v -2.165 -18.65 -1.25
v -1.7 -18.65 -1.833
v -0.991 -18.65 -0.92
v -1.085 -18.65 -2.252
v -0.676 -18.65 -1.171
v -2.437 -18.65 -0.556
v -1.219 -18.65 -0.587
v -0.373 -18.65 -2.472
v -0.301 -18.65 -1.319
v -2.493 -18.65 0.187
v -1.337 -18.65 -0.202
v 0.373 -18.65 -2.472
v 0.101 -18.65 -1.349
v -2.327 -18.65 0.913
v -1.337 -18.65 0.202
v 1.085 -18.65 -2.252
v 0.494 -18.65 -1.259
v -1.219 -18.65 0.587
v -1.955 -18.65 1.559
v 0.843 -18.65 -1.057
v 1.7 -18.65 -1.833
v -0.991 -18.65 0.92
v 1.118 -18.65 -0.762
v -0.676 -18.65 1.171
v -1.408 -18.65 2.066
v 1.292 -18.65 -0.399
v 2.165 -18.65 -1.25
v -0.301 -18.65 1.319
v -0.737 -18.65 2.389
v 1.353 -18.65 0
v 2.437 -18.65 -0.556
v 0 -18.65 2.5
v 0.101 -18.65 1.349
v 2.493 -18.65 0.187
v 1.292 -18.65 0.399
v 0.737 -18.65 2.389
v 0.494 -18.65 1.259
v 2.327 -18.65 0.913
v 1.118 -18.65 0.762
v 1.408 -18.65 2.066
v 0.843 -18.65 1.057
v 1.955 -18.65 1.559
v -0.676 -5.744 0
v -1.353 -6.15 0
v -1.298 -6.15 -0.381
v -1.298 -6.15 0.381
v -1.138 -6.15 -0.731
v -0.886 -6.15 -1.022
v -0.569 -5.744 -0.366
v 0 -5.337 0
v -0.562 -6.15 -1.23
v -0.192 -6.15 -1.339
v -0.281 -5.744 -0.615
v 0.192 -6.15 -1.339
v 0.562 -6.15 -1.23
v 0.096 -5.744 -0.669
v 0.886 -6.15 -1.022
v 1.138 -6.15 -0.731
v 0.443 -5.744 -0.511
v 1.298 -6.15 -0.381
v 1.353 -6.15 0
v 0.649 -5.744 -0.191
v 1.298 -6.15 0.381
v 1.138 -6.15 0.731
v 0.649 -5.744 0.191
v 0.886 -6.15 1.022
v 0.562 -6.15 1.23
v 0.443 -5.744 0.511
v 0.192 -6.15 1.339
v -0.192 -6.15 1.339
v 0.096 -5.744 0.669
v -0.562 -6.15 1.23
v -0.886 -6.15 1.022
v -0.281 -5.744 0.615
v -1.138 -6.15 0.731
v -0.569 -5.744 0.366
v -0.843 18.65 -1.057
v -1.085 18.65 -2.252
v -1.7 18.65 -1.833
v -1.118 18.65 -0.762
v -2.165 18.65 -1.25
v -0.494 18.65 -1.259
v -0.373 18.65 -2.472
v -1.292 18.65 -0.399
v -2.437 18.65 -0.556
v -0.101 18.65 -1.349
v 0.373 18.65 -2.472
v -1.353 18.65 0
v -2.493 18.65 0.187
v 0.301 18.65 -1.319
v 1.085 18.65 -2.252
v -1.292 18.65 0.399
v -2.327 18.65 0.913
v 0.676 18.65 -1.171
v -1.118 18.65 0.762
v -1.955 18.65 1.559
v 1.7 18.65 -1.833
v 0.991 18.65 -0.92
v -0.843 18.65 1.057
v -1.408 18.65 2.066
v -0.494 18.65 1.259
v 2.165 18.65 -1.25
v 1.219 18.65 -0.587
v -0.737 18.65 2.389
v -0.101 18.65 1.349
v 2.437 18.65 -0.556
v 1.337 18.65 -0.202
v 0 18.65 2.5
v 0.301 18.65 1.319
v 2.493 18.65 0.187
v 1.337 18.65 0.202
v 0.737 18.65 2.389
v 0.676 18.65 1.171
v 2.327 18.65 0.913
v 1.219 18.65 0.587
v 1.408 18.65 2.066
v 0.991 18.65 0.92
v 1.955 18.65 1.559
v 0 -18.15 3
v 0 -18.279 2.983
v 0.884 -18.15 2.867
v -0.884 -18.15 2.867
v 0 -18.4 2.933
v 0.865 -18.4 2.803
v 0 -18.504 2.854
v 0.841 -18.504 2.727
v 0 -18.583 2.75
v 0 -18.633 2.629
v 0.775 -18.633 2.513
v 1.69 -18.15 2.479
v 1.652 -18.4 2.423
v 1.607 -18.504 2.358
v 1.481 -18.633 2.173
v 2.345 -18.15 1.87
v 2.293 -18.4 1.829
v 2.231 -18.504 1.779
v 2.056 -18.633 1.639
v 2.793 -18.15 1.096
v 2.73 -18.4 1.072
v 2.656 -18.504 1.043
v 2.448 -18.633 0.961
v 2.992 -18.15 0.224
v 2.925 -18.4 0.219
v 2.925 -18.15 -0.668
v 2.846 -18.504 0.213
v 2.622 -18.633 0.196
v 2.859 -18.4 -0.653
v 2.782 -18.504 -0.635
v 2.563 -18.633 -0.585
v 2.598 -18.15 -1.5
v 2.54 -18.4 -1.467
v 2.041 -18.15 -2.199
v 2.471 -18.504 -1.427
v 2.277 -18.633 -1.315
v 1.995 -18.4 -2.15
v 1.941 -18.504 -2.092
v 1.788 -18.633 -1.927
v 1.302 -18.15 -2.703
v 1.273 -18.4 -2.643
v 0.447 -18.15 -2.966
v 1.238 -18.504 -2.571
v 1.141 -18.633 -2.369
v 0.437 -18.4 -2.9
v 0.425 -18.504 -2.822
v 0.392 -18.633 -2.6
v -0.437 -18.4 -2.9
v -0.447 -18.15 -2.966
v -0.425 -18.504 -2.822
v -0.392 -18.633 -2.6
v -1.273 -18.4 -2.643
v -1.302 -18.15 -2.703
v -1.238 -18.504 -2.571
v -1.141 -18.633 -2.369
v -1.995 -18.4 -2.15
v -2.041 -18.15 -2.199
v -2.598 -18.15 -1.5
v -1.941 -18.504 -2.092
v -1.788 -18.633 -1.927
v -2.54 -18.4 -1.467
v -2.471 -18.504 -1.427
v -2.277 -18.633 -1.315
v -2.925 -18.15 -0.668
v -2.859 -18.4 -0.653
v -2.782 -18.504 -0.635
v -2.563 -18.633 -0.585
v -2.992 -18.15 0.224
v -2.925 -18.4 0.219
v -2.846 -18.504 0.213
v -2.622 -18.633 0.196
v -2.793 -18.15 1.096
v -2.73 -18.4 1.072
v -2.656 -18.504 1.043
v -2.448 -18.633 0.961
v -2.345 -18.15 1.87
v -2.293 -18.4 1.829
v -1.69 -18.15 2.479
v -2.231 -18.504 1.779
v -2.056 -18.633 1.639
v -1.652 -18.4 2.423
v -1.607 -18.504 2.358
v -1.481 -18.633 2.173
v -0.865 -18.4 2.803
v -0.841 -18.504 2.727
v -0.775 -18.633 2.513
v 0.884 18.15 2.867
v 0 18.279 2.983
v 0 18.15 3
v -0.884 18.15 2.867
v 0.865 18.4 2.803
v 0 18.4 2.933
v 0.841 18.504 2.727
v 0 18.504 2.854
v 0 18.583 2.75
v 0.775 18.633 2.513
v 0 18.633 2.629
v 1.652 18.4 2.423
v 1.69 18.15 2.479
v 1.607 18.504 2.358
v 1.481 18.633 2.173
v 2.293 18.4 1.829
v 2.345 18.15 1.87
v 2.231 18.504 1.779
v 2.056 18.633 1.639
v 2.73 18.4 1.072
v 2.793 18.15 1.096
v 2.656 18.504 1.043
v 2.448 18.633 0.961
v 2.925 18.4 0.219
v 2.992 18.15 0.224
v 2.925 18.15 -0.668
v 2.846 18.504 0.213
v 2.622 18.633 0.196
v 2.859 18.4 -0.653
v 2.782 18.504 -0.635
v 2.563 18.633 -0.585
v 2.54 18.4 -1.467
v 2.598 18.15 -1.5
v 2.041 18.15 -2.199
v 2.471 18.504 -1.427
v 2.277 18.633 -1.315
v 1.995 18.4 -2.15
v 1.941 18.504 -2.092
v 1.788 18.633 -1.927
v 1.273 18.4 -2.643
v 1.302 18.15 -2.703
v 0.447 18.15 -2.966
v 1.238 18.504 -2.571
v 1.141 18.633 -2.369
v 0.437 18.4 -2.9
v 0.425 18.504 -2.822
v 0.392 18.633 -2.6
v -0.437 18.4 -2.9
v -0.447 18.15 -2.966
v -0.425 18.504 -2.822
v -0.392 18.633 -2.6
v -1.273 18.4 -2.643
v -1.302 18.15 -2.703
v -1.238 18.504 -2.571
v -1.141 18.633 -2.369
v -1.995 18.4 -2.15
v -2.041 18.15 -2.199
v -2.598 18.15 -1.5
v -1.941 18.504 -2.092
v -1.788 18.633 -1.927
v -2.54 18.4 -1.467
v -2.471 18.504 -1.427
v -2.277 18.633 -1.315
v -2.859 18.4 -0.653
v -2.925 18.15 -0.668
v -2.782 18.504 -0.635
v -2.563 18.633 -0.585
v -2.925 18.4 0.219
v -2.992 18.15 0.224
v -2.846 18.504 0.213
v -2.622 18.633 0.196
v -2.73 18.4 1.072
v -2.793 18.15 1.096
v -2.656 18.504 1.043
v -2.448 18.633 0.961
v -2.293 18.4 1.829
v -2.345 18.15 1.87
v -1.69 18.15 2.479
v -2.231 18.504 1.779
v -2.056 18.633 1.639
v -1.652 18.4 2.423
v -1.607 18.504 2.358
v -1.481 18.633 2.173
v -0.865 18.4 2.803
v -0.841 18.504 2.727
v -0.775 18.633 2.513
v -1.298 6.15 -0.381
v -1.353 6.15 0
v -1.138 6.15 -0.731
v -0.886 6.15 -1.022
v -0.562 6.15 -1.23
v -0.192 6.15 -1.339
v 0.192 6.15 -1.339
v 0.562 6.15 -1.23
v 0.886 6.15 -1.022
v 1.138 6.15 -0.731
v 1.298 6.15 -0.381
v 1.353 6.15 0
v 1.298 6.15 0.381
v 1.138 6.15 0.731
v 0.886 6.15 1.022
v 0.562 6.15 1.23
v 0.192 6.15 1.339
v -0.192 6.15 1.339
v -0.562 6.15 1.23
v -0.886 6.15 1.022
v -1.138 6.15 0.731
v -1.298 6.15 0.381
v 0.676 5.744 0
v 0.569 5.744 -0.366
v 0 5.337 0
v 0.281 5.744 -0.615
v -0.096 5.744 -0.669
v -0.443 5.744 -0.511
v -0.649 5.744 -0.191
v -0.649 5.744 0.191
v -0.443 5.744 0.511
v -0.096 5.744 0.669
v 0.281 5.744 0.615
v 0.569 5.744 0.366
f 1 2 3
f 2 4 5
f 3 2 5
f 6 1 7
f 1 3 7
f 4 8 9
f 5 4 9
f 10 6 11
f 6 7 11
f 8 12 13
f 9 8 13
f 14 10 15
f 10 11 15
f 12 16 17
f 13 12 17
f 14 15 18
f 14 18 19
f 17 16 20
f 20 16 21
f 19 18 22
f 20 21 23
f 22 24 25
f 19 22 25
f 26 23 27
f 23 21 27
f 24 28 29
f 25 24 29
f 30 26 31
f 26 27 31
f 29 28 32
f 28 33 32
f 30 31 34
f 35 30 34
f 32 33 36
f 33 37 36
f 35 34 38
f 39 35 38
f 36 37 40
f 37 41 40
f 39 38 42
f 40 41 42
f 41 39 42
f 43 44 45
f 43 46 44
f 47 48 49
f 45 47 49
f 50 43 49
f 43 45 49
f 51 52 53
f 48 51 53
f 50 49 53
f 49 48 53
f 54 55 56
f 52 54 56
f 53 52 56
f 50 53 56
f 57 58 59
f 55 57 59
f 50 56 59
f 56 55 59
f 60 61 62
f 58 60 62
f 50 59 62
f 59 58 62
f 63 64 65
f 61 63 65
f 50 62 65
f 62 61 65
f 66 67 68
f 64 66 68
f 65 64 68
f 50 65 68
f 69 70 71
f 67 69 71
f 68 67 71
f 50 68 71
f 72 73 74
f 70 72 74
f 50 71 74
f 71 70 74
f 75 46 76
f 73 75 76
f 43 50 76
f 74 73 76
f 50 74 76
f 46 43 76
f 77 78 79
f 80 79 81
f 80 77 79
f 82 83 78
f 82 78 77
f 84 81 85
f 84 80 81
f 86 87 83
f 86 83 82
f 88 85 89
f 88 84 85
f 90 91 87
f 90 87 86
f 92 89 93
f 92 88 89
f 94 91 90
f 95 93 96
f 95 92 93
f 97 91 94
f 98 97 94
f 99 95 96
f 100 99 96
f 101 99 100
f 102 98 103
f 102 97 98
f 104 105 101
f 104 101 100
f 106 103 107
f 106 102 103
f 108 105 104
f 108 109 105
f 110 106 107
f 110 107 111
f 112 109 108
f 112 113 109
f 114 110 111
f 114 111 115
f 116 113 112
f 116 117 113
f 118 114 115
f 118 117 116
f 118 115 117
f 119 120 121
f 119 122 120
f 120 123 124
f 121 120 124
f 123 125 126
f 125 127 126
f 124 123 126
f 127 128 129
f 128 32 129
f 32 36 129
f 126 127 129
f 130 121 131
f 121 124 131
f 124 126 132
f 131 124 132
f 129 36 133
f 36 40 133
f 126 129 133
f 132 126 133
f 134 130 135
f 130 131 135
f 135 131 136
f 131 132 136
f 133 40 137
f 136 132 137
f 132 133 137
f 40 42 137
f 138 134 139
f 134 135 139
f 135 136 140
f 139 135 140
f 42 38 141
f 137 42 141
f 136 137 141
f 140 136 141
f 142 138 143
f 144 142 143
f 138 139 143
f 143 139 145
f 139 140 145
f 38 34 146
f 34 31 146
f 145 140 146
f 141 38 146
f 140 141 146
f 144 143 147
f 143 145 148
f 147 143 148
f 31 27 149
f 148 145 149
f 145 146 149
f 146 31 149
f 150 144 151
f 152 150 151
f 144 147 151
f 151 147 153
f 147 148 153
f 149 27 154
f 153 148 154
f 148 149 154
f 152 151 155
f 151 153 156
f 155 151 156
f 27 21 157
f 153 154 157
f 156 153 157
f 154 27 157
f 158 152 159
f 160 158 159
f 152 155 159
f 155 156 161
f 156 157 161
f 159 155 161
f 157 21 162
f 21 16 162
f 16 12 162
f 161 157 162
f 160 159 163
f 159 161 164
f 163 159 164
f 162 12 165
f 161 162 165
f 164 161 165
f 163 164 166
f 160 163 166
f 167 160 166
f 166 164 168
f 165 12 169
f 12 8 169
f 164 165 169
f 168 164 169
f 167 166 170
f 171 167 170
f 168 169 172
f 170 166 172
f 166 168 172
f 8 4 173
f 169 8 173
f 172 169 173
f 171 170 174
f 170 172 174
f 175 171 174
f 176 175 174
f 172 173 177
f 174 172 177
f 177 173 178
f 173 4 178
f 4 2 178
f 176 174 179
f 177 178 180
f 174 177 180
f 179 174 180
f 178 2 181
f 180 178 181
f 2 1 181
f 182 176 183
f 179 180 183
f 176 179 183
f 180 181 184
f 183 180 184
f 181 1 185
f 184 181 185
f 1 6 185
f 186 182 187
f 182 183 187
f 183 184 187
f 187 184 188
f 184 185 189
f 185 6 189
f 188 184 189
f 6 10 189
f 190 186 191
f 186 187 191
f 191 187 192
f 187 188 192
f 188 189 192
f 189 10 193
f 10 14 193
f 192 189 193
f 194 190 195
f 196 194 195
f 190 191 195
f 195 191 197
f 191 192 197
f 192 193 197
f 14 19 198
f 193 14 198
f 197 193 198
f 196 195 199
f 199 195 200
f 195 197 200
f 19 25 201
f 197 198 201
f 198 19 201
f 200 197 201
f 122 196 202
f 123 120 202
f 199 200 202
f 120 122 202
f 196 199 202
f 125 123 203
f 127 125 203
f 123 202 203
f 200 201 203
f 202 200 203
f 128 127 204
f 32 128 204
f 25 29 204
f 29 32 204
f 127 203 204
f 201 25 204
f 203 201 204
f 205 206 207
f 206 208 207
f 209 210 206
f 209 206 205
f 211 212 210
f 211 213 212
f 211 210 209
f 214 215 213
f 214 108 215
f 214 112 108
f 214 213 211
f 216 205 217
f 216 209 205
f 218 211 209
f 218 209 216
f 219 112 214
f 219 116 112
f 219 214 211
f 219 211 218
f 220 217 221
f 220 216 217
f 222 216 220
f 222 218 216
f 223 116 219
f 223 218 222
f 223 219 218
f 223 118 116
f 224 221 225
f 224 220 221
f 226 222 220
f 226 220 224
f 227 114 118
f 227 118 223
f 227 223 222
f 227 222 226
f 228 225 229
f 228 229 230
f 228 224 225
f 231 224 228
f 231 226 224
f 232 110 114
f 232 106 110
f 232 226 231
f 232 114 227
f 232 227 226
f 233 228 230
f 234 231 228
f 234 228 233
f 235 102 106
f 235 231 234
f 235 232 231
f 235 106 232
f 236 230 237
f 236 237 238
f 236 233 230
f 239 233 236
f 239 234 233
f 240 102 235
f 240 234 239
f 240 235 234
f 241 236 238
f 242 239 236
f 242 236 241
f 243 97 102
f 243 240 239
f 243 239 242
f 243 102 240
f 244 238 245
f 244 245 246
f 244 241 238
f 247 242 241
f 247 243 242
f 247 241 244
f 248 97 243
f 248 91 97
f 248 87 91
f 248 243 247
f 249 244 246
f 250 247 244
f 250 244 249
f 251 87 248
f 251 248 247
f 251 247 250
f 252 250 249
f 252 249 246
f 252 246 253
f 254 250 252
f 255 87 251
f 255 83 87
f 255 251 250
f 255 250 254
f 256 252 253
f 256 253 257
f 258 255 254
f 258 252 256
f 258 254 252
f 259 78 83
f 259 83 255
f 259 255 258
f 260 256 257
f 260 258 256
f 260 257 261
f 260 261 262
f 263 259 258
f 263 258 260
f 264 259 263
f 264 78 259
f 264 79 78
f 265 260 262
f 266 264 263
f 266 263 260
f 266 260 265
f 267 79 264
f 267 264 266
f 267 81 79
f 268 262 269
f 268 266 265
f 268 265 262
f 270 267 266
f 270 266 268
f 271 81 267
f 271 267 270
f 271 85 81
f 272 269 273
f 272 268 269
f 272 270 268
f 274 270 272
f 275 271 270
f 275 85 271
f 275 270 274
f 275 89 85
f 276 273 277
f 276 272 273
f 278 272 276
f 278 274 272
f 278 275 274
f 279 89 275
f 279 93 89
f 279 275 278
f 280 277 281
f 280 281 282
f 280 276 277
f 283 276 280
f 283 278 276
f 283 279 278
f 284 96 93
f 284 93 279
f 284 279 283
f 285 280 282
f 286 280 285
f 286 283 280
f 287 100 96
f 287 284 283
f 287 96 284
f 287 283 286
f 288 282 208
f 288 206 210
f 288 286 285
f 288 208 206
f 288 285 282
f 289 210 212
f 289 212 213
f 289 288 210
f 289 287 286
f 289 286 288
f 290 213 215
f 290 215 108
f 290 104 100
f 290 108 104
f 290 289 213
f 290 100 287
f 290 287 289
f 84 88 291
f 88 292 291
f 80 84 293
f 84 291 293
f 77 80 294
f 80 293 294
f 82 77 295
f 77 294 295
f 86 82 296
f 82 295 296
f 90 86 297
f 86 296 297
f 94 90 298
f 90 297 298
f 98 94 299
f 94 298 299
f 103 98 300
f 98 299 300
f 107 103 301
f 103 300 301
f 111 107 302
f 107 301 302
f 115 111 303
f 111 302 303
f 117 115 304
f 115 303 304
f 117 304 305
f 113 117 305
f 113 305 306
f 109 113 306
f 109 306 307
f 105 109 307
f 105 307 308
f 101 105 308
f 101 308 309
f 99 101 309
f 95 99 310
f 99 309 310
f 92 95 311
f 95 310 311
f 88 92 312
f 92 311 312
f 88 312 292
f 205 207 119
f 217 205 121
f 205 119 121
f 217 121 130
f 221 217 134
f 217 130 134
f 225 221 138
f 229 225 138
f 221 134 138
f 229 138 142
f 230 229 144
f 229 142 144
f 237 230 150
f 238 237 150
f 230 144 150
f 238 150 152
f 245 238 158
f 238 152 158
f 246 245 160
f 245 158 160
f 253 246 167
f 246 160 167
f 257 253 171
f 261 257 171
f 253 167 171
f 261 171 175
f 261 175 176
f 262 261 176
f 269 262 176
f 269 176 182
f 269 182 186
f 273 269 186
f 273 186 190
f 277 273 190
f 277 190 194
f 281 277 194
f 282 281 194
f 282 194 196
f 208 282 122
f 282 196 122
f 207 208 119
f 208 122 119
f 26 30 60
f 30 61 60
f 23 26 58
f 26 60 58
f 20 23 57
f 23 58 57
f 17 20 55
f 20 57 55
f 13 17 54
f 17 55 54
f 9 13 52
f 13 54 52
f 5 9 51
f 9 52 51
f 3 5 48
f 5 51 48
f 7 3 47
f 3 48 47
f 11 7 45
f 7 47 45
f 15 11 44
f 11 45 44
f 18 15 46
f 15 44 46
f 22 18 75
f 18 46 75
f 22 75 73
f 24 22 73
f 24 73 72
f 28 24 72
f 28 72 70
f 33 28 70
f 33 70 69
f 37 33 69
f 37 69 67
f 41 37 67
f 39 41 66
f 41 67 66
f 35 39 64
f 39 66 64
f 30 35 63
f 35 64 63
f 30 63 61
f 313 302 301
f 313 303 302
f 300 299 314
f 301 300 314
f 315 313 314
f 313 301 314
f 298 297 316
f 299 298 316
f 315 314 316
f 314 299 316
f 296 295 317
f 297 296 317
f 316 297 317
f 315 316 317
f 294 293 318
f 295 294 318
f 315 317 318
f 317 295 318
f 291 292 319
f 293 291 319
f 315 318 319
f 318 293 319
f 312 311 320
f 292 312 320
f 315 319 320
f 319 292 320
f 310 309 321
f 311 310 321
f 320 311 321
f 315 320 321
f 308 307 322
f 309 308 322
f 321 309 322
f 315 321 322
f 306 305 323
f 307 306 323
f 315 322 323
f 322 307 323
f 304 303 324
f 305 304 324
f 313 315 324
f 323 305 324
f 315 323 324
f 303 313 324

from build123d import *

# Parameters (mm, degrees)
BOSS_EXTRUDE1_DEPTH       = 18.65
BOSS_EXTRUDE1_DEPTH_BACK  = 18.65
SKETCH1_R                 = 3
F_6_32_TAPPED_HOLE1_D     = 2.7051
F_6_32_TAPPED_HOLE1_DEPTH = 12.5
F_6_32_TAPPED_HOLE1_TIP   = 0.81269403
F_6_32_TAPPED_HOLE2_D     = 2.7051
F_6_32_TAPPED_HOLE2_DEPTH = 12.5
F_6_32_TAPPED_HOLE2_TIP   = 0.81269403
FILLET1_R                 = 0.5


with BuildPart() as part:
    # Sketch1 → Boss-Extrude1 (new, two sides: drawn at the far end of the back side and taken through both)
    with BuildSketch(Plane(origin=(0, 0, 0), x_dir=(1, 0, 0), z_dir=(0, 1, 0)).offset(-BOSS_EXTRUDE1_DEPTH_BACK)):
        Circle(SKETCH1_R)
    extrude(amount=BOSS_EXTRUDE1_DEPTH + BOSS_EXTRUDE1_DEPTH_BACK)

    # #6-32 Tapped Hole1
    with Locations(Plane(origin=(0, 18.65, 0), x_dir=(1, 0, 0), z_dir=(0, 1, 0))):
        with Locations((0, 0)):
            Hole(F_6_32_TAPPED_HOLE1_D / 2, depth=F_6_32_TAPPED_HOLE1_DEPTH)
            with Locations((0, 0, -(F_6_32_TAPPED_HOLE1_DEPTH + F_6_32_TAPPED_HOLE1_TIP / 2))):  # 118° drill point
                Cone(0, F_6_32_TAPPED_HOLE1_D / 2, F_6_32_TAPPED_HOLE1_TIP, mode=Mode.SUBTRACT)

    # #6-32 Tapped Hole2
    with Locations(Plane(origin=(0, -18.65, 0), x_dir=(-1, 0, 0), z_dir=(0, -1, 0))):
        with Locations((0, 0)):
            Hole(F_6_32_TAPPED_HOLE2_D / 2, depth=F_6_32_TAPPED_HOLE2_DEPTH)
            with Locations((0, 0, -(F_6_32_TAPPED_HOLE2_DEPTH + F_6_32_TAPPED_HOLE2_TIP / 2))):  # 118° drill point
                Cone(0, F_6_32_TAPPED_HOLE2_D / 2, F_6_32_TAPPED_HOLE2_TIP, mode=Mode.SUBTRACT)

    # Fillet1
    fillet1_edges = [part.edges().sort_by_distance(p)[0] for p in [
        (-3, -18.65, 0),
        (-3, 18.65, 0),
    ]]
    fillet(fillet1_edges, radius=FILLET1_R)


solid = part.part
